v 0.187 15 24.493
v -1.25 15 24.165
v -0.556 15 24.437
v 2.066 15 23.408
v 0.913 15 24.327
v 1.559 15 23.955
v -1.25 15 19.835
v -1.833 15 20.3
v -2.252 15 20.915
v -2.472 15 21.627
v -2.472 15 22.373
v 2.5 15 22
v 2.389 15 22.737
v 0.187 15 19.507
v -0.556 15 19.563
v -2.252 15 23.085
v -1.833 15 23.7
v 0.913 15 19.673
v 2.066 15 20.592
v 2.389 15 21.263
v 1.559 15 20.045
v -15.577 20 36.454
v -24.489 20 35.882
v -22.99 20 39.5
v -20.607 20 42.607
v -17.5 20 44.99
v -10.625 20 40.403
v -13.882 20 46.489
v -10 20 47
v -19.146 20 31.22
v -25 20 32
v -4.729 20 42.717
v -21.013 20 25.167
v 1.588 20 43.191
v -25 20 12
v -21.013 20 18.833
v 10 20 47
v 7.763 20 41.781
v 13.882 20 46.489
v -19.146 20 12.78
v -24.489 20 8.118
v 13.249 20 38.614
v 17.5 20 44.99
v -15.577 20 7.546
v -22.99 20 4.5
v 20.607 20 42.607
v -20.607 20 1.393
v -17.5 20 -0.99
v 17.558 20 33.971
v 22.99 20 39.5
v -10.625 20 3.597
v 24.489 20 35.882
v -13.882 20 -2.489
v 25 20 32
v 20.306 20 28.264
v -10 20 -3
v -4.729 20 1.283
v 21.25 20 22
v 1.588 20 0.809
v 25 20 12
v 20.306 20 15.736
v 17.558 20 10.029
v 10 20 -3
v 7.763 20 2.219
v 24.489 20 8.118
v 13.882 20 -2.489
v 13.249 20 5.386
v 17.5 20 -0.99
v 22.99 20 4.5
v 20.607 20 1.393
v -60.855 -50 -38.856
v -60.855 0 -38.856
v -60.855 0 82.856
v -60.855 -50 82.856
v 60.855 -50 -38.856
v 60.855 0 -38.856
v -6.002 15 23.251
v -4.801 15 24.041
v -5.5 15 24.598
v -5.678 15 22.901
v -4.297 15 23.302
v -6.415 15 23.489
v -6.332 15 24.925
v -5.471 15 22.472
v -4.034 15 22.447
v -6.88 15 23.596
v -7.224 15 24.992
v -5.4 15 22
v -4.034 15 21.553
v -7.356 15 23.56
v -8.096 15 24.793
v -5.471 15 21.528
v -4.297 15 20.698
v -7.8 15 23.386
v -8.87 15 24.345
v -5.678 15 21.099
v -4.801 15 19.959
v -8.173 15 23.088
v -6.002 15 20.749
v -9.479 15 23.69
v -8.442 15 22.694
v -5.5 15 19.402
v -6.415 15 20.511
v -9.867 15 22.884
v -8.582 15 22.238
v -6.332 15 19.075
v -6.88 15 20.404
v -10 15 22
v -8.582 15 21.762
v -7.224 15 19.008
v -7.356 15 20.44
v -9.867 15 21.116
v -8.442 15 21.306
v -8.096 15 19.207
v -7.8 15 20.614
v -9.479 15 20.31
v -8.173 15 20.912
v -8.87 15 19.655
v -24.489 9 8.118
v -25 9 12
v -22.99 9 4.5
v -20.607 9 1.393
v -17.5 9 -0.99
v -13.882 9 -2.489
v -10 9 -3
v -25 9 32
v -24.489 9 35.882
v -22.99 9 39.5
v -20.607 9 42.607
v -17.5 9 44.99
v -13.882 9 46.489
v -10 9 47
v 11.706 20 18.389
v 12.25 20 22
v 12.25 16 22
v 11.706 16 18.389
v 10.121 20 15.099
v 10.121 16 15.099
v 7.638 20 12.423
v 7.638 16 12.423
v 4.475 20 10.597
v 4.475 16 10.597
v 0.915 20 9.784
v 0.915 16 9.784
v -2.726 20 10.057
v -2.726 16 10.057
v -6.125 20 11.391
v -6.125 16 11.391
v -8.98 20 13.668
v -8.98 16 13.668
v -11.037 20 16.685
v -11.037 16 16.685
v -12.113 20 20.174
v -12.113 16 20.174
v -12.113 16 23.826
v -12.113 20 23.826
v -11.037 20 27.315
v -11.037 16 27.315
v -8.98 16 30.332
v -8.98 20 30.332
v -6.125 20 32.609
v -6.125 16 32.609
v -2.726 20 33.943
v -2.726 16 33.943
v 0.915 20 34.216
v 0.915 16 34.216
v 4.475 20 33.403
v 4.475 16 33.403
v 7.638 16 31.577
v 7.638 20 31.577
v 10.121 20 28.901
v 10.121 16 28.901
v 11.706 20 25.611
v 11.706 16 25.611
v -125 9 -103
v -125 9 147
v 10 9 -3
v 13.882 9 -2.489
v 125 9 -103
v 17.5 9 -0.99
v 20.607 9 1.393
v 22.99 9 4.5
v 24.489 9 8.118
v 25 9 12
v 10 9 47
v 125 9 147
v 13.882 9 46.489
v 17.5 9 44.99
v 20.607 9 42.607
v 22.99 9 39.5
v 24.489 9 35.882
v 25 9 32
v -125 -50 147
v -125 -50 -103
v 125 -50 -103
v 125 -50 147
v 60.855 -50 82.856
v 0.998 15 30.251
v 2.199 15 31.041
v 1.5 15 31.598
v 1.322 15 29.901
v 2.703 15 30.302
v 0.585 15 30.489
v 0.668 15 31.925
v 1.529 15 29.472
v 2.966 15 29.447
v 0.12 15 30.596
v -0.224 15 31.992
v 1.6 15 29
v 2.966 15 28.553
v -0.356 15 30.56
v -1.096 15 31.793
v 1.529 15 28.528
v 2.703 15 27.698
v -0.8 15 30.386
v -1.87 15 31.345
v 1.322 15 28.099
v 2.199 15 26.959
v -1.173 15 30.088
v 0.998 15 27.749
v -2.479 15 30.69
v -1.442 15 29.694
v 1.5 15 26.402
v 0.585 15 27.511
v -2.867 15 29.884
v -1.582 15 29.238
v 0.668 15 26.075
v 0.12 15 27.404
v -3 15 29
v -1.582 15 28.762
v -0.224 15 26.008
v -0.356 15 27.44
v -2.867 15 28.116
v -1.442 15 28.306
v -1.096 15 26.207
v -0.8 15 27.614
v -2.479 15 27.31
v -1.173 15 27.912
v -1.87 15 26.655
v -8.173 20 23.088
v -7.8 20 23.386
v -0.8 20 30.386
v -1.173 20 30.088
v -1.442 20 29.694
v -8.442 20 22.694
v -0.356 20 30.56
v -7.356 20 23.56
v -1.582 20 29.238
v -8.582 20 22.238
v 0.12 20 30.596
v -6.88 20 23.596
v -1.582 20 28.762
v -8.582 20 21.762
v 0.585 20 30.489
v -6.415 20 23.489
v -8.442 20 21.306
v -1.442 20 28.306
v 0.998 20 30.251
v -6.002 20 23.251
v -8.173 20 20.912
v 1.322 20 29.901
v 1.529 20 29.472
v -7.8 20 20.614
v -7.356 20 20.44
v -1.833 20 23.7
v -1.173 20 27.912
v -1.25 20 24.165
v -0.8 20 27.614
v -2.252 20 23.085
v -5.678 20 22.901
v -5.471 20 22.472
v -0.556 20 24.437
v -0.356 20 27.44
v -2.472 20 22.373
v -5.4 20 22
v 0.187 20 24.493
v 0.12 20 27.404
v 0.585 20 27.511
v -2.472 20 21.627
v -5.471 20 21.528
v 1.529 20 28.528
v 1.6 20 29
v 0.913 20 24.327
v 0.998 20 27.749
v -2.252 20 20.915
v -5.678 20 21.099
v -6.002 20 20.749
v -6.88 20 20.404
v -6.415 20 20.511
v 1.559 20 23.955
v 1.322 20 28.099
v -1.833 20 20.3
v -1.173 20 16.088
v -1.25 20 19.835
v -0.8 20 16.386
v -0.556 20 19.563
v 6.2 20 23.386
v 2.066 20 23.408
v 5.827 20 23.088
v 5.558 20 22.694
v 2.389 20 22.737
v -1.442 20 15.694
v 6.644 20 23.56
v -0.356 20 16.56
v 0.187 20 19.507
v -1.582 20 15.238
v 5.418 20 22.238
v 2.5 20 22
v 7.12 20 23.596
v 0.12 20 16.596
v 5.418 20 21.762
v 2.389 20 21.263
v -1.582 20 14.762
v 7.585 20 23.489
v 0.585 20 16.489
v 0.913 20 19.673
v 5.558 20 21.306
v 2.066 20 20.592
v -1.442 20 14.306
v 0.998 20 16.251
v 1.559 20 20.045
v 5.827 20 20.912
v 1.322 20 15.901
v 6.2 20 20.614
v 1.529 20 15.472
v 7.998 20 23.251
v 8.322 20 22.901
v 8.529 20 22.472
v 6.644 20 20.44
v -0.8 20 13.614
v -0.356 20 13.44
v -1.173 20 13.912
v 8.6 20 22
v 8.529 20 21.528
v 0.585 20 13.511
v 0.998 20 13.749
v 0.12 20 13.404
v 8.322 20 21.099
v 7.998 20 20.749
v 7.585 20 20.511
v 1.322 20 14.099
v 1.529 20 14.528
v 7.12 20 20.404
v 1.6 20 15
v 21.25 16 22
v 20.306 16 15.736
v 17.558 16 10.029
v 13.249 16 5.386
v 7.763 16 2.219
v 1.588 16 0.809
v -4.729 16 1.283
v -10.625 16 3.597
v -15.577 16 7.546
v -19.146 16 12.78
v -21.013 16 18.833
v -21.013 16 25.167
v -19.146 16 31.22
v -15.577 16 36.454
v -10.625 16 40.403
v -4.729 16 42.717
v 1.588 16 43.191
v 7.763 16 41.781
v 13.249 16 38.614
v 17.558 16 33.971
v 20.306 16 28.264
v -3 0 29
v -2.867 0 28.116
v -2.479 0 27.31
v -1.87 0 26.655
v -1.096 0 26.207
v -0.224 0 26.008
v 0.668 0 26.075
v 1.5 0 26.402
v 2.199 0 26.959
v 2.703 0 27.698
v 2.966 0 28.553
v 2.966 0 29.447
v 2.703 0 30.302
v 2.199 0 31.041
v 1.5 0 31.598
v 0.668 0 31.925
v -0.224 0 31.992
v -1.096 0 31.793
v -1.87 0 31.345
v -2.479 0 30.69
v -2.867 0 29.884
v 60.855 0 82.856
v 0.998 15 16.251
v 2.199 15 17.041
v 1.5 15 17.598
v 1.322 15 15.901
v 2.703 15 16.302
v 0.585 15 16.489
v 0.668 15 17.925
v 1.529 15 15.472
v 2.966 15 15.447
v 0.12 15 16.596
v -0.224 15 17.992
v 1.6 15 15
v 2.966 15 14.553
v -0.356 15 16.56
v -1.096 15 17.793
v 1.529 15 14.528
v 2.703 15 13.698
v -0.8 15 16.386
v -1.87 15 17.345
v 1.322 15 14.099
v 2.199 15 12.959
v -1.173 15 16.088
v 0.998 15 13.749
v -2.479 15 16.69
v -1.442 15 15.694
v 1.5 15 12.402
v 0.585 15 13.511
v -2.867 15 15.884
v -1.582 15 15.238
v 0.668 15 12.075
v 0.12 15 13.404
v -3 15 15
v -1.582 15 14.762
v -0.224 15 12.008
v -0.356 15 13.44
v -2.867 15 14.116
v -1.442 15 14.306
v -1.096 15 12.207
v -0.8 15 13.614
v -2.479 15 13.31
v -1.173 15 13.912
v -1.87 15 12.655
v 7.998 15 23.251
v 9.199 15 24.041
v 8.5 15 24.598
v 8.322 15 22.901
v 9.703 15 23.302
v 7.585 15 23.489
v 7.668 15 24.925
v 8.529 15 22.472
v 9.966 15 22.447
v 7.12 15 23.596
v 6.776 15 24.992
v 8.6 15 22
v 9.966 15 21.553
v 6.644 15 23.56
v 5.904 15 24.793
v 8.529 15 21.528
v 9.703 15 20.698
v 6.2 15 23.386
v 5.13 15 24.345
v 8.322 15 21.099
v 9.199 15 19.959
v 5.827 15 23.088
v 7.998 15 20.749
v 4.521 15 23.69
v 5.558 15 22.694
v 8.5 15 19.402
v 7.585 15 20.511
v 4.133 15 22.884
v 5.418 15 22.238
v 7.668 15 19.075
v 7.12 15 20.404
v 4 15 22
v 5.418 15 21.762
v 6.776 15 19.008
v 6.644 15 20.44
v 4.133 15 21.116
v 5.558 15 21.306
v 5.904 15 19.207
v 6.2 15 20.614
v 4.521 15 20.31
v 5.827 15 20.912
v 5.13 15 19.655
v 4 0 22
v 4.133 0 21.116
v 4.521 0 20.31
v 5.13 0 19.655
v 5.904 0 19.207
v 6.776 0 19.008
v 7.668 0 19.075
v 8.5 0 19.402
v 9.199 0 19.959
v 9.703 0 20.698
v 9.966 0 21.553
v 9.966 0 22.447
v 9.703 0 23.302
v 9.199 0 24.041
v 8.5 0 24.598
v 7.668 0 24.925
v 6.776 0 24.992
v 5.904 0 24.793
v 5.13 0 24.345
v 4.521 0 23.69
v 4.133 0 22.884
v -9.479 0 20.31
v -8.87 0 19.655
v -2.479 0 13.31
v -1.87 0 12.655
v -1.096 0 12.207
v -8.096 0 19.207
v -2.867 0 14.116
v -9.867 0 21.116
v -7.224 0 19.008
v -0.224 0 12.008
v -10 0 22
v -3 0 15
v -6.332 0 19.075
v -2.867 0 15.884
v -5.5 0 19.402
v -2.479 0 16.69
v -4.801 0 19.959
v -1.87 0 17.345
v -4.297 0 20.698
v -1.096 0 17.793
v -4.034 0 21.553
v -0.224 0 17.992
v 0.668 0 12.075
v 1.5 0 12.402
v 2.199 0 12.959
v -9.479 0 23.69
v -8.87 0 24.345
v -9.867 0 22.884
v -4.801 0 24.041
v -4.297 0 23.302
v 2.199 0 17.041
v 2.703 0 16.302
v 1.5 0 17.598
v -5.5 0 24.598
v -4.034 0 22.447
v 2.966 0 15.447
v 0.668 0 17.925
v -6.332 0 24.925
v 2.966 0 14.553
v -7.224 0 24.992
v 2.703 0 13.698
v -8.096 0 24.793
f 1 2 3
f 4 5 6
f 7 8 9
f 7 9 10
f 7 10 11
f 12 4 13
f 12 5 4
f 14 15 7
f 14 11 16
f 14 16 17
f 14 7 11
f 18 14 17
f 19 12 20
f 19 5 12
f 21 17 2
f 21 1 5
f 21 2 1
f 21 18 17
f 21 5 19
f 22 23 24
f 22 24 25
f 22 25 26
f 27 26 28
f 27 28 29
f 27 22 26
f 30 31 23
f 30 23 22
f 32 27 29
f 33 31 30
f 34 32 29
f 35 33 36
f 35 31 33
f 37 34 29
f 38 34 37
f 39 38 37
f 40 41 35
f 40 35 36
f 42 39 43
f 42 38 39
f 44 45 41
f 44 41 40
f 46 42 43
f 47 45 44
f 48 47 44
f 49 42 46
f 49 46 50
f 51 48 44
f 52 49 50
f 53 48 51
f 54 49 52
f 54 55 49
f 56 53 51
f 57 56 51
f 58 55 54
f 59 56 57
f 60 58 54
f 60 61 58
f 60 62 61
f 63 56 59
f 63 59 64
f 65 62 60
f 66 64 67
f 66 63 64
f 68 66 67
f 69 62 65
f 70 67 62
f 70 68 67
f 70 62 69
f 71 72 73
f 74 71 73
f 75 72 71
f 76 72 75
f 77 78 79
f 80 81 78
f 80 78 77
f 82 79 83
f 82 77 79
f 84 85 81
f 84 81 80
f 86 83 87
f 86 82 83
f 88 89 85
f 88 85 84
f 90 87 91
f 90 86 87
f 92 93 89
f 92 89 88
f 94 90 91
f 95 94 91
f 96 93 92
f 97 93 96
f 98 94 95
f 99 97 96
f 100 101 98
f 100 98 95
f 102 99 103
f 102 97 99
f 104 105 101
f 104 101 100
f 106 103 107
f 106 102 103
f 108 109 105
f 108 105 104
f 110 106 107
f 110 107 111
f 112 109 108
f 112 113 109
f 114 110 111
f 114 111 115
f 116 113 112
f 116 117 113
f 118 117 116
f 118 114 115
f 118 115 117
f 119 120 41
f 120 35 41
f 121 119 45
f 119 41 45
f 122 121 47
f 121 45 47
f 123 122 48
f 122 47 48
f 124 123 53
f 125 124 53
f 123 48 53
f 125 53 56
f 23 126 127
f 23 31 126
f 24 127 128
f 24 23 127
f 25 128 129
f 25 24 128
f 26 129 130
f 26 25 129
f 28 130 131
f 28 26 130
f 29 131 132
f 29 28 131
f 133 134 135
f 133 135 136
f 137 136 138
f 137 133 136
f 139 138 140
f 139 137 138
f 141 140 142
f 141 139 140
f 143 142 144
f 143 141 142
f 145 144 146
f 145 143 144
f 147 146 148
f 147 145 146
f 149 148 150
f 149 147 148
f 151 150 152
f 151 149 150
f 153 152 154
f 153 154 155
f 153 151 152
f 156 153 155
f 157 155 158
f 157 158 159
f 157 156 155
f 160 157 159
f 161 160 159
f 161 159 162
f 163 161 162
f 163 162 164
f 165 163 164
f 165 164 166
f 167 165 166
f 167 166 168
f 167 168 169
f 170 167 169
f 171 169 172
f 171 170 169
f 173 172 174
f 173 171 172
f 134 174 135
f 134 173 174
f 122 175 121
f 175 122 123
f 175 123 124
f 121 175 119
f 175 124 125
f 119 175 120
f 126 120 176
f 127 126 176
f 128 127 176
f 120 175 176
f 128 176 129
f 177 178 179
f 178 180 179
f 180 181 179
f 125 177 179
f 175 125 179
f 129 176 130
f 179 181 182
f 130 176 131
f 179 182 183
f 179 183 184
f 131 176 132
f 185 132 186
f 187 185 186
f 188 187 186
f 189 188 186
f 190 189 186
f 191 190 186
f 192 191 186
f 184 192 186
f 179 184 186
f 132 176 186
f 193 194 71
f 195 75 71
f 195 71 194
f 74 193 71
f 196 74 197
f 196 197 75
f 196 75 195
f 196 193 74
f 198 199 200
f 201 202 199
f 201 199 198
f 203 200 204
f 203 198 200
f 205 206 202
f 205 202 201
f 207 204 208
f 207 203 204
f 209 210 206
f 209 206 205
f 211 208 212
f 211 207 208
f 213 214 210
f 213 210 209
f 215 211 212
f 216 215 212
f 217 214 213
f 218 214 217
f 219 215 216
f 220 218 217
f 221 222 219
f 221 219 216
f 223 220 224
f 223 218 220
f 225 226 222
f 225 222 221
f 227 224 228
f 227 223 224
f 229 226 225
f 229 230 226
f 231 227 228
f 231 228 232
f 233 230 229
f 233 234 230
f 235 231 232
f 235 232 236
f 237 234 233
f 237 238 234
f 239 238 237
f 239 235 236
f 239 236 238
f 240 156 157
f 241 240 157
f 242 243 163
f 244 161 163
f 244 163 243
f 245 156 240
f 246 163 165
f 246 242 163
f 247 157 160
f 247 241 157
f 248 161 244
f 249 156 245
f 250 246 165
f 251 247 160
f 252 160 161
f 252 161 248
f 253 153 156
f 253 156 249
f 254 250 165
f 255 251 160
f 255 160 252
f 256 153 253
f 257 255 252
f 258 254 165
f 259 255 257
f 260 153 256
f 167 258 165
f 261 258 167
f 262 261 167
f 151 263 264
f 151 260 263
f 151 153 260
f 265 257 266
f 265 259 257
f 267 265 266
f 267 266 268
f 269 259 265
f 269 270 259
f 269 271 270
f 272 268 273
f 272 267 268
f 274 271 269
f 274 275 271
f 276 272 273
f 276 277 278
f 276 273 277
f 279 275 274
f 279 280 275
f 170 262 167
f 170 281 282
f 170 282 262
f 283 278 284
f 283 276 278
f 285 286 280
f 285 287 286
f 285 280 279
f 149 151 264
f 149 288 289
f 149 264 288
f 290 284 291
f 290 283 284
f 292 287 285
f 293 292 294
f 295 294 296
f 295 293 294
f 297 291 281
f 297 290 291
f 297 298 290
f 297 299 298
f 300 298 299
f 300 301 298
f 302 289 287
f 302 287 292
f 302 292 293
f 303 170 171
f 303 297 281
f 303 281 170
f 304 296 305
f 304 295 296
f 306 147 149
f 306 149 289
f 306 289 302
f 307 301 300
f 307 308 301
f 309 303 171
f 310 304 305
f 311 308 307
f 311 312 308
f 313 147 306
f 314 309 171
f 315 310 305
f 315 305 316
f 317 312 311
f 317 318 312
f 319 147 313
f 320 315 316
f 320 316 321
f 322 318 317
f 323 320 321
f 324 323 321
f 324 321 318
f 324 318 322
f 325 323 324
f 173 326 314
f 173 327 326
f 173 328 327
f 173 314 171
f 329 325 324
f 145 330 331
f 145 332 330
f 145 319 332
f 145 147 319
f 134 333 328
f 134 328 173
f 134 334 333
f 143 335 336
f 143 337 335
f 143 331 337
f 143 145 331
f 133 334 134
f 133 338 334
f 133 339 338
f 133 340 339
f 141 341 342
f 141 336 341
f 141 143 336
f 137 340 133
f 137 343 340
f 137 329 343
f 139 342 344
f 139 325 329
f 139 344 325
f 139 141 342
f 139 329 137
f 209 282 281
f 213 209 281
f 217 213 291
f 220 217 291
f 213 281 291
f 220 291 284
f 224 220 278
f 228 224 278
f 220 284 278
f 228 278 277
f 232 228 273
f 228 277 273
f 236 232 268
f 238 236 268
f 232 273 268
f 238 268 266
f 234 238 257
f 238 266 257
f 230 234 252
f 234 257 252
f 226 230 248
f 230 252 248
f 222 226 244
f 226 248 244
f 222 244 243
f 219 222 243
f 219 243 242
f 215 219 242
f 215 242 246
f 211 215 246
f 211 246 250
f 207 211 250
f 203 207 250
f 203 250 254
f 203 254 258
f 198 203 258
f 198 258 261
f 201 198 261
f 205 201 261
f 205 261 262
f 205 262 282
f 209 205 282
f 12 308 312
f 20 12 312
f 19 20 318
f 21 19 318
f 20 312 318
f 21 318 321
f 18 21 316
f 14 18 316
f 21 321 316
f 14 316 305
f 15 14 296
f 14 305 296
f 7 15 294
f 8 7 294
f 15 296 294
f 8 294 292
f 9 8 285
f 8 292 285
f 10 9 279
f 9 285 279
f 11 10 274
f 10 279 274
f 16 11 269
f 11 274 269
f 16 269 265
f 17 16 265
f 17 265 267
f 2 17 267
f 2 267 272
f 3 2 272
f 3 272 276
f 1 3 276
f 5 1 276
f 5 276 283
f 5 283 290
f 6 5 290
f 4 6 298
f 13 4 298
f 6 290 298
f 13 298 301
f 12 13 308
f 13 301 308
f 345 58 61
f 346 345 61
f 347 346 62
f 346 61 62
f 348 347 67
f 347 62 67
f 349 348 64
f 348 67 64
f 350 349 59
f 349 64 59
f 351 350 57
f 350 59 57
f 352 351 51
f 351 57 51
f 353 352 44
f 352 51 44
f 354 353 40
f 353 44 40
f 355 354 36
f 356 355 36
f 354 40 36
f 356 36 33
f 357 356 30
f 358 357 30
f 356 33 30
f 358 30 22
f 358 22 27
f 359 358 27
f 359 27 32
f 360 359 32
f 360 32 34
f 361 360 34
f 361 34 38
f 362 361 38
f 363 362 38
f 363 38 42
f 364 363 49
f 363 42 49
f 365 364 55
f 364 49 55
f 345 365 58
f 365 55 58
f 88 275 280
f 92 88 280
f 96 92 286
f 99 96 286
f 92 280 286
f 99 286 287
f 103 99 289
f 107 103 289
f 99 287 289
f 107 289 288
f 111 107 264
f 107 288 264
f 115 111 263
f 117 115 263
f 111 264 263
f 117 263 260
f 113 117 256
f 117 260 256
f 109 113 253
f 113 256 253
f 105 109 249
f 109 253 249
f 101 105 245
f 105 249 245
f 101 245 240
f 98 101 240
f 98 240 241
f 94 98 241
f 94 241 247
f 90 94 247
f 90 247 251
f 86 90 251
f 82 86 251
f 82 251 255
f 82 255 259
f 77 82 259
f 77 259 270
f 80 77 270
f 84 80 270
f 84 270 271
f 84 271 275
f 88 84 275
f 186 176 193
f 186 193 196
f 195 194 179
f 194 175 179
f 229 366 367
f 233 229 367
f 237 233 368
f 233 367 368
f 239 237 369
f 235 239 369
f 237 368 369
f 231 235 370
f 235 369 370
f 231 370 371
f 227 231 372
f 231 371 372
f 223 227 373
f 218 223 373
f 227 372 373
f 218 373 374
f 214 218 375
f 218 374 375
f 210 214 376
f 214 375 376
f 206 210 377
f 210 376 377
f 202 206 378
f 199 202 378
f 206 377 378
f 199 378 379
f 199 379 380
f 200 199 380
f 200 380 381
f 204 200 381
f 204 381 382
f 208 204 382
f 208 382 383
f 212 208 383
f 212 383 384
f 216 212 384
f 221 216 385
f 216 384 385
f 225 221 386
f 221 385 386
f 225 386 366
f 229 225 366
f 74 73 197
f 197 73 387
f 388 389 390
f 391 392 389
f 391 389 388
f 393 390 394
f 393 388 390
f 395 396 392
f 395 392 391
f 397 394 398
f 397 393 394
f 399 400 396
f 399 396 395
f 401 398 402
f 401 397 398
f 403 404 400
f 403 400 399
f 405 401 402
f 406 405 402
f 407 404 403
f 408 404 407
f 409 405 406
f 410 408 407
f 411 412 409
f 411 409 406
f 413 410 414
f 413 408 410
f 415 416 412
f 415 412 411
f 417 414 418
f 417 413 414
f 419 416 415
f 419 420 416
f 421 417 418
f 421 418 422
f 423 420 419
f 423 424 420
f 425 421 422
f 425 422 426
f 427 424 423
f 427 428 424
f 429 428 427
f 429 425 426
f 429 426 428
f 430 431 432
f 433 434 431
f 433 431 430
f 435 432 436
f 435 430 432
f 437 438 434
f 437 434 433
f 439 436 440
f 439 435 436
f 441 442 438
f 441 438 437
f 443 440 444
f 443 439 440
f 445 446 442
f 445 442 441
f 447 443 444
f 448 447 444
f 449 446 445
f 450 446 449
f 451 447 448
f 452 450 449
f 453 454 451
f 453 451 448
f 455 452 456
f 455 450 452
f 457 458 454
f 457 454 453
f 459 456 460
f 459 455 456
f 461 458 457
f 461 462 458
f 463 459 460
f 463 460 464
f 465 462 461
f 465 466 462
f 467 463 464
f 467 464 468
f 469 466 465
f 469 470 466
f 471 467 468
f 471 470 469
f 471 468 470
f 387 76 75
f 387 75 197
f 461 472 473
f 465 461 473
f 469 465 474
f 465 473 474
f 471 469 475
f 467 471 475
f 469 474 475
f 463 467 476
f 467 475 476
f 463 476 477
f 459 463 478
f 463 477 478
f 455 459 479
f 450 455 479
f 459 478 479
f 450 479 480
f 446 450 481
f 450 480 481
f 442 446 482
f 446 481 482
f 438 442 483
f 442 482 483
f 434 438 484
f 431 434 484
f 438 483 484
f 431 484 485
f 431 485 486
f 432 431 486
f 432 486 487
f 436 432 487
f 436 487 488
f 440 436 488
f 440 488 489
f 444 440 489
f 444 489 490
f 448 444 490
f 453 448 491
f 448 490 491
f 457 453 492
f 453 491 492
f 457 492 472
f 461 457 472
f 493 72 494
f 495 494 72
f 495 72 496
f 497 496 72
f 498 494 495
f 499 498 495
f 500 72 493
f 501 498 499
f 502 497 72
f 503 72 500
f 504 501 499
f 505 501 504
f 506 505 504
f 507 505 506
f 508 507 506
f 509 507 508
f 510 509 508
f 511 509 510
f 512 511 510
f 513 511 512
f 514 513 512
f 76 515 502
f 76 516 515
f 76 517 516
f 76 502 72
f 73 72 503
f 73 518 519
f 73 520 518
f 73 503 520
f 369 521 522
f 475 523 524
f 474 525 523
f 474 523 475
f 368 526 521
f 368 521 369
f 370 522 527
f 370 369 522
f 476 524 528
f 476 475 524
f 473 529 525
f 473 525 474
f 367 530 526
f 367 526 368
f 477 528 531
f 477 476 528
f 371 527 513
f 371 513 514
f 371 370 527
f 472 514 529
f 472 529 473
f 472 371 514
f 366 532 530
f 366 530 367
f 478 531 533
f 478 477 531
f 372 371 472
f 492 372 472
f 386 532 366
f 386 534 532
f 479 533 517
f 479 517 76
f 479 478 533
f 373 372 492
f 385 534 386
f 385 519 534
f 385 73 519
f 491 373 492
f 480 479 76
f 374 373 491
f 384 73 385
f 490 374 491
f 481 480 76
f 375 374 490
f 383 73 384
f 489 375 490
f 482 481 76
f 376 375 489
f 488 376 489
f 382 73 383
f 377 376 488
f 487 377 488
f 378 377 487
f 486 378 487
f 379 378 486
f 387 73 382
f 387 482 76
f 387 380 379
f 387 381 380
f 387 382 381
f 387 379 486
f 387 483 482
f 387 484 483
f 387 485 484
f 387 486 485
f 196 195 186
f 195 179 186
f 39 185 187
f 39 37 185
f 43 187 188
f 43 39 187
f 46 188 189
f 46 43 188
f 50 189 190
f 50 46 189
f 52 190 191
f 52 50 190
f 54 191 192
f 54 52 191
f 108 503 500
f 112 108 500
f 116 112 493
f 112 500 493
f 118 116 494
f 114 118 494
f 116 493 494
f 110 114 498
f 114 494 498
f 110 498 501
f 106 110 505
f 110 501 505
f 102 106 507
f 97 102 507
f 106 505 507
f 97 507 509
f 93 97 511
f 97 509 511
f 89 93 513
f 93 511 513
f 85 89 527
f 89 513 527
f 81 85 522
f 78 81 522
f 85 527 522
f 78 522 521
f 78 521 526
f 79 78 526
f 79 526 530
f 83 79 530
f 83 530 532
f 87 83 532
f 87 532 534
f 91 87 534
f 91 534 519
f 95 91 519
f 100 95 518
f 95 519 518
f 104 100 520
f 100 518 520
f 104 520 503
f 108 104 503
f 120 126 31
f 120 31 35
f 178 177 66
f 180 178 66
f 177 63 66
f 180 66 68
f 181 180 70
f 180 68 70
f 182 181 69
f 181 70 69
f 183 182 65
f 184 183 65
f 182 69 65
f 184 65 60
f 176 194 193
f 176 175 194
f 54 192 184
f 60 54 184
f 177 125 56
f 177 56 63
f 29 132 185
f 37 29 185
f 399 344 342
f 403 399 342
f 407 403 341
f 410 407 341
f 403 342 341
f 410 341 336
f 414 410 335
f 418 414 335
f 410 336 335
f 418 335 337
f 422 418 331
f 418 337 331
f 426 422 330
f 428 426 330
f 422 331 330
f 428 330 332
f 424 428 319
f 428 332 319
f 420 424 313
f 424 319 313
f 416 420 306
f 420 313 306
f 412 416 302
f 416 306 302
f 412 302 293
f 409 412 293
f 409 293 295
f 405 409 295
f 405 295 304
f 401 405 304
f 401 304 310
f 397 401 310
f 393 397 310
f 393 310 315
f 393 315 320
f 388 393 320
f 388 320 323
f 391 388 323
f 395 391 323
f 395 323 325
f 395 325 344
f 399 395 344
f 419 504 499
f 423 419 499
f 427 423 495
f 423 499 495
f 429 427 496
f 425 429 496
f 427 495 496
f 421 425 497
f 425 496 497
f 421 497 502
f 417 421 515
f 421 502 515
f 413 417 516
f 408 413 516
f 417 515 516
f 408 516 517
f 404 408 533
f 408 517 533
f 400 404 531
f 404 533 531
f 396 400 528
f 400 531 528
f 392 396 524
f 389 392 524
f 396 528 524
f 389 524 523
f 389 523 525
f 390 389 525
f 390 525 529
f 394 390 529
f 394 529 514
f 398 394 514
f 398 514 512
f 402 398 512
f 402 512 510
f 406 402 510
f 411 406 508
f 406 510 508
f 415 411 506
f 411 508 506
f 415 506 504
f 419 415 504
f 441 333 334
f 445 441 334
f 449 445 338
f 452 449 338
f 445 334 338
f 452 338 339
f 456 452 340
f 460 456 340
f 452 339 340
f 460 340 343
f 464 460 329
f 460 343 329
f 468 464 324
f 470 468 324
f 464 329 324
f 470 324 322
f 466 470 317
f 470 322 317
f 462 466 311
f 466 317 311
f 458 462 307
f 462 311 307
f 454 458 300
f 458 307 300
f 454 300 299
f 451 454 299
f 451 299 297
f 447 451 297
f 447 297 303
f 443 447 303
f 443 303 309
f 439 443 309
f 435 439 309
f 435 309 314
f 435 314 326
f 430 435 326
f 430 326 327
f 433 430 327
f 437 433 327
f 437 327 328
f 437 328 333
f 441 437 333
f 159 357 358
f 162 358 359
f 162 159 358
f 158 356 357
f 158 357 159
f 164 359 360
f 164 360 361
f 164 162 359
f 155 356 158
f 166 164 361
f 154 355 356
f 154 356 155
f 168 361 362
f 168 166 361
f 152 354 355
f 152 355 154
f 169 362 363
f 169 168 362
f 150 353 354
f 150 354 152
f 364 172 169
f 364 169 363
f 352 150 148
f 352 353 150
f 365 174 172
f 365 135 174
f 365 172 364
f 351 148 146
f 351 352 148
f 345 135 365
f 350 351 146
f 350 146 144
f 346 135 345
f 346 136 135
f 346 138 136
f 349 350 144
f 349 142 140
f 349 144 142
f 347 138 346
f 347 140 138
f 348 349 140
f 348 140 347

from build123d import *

# Parameters (mm, degrees)
BOSS_EXTRUDE1_DEPTH          = 44
SKETCH3_W                    = 50
SKETCH3_H                    = 50
BOSS_EXTRUDE2_DEPTH          = 11
SKETCH4_R                    = 21.25
SKETCH4_R_2                  = 12.25
CUT_EXTRUDE1_DEPTH           = 4
SKETCH5_3_R                  = 1.6
CUT_EXTRUDE3_DEPTH           = 20
SKETCH5_R                    = 2.5
CUT_EXTRUDE4_DEPTH           = 5
FILLET2_R                    = 15
SKETCH8_R                    = 3
CUT_EXTRUDE5_DEPTH           = 15
SCHIZZO2_W                   = 250
SCHIZZO2_H                   = 250
SCHIZZO2_W_2                 = 25.273765435
SCHIZZO2_H_2                 = 26.723899517
ESTRUSIONE_ESTRUSIONE1_DEPTH = 9
SCHIZZO5_W                   = 250
SCHIZZO5_H                   = 250
SCHIZZO5_W_2                 = 121.71
SCHIZZO5_H_2                 = 121.711825152
ESTRUSIONE_ESTRUSIONE2_DEPTH = 50


with BuildPart() as part:
    # Sketch1 → Boss-Extrude1 (new body)
    with BuildSketch(Plane.XY):
        Polygon((-22.5, 0), (22.5, 0), (18, 9), (-18, 9), align=None)
    extrude(amount=BOSS_EXTRUDE1_DEPTH)

    # Sketch3 → Boss-Extrude2 (add)
    with BuildSketch(Plane(origin=(0, 9, 0), x_dir=(1, 0, 0), z_dir=(0, 1, 0))):
        with Locations((0, -22)):
            Rectangle(SKETCH3_W, SKETCH3_H)
    extrude(amount=BOSS_EXTRUDE2_DEPTH)

    # Sketch4 → Cut-Extrude1 (cut)
    with BuildSketch(Plane(origin=(0, 20, 0), x_dir=(1, 0, 0), z_dir=(0, 1, 0))):
        with Locations((0, -22)):
            Circle(SKETCH4_R)
        with Locations((0, -22)):
            Circle(SKETCH4_R_2, mode=Mode.SUBTRACT)
    extrude(amount=-CUT_EXTRUDE1_DEPTH, mode=Mode.SUBTRACT)

    # Sketch5<3> → Cut-Extrude3 (cut)
    with BuildSketch(Plane(origin=(0, 20, 0), x_dir=(1, 0, 0), z_dir=(0, 1, 0))):
        with Locations((0, -15)):
            Circle(SKETCH5_3_R)
        with Locations((-7, -22)):
            Circle(SKETCH5_3_R)
        with Locations((7, -22)):
            Circle(SKETCH5_3_R)
        with Locations((0, -29)):
            Circle(SKETCH5_3_R)
    extrude(amount=-CUT_EXTRUDE3_DEPTH, mode=Mode.SUBTRACT)

    # Sketch5 → Cut-Extrude4 (cut)
    with BuildSketch(Plane(origin=(0, 20, 0), x_dir=(1, 0, 0), z_dir=(0, 1, 0))):
        with Locations((0, -22)):
            Circle(SKETCH5_R)
    extrude(amount=-CUT_EXTRUDE4_DEPTH, mode=Mode.SUBTRACT)

    # Fillet2
    fillet2_edges = [part.edges().sort_by_distance(p)[0] for p in [
        (25, 14.5, 47),
        (25, 14.5, -3),
        (-25, 14.5, -3),
        (-25, 14.5, 47),
    ]]
    fillet(fillet2_edges, radius=FILLET2_R)

    # Sketch8 → Cut-Extrude5 (cut)
    with BuildSketch(Plane(origin=(0, 0, 0), x_dir=(-1, 0, 0), z_dir=(0, -1, 0))):
        with Locations((0, -29)):
            Circle(SKETCH8_R)
        with Locations((-7, -22)):
            Circle(SKETCH8_R)
        with Locations((0, -15)):
            Circle(SKETCH8_R)
        with Locations((7, -22)):
            Circle(SKETCH8_R)
    extrude(amount=-CUT_EXTRUDE5_DEPTH, mode=Mode.SUBTRACT)

    # Schizzo2 → Estrusione-Estrusione1 (add)
    with BuildSketch(Plane.XZ):
        with Locations((0, 22)):
            Rectangle(SCHIZZO2_W, SCHIZZO2_H)
        with Locations((-0.310743018, 21.585675977)):
            Rectangle(SCHIZZO2_W_2, SCHIZZO2_H_2, mode=Mode.SUBTRACT)
    extrude(amount=-ESTRUSIONE_ESTRUSIONE1_DEPTH)

    # Schizzo5 → Estrusione-Estrusione2 (add)
    with BuildSketch(Plane.XZ):
        with Locations((0, 22)):
            Rectangle(SCHIZZO5_W, SCHIZZO5_H)
        with Locations((0, 22)):
            Rectangle(SCHIZZO5_W_2, SCHIZZO5_H_2, mode=Mode.SUBTRACT)
    extrude(amount=ESTRUSIONE_ESTRUSIONE2_DEPTH)


solid = part.part
